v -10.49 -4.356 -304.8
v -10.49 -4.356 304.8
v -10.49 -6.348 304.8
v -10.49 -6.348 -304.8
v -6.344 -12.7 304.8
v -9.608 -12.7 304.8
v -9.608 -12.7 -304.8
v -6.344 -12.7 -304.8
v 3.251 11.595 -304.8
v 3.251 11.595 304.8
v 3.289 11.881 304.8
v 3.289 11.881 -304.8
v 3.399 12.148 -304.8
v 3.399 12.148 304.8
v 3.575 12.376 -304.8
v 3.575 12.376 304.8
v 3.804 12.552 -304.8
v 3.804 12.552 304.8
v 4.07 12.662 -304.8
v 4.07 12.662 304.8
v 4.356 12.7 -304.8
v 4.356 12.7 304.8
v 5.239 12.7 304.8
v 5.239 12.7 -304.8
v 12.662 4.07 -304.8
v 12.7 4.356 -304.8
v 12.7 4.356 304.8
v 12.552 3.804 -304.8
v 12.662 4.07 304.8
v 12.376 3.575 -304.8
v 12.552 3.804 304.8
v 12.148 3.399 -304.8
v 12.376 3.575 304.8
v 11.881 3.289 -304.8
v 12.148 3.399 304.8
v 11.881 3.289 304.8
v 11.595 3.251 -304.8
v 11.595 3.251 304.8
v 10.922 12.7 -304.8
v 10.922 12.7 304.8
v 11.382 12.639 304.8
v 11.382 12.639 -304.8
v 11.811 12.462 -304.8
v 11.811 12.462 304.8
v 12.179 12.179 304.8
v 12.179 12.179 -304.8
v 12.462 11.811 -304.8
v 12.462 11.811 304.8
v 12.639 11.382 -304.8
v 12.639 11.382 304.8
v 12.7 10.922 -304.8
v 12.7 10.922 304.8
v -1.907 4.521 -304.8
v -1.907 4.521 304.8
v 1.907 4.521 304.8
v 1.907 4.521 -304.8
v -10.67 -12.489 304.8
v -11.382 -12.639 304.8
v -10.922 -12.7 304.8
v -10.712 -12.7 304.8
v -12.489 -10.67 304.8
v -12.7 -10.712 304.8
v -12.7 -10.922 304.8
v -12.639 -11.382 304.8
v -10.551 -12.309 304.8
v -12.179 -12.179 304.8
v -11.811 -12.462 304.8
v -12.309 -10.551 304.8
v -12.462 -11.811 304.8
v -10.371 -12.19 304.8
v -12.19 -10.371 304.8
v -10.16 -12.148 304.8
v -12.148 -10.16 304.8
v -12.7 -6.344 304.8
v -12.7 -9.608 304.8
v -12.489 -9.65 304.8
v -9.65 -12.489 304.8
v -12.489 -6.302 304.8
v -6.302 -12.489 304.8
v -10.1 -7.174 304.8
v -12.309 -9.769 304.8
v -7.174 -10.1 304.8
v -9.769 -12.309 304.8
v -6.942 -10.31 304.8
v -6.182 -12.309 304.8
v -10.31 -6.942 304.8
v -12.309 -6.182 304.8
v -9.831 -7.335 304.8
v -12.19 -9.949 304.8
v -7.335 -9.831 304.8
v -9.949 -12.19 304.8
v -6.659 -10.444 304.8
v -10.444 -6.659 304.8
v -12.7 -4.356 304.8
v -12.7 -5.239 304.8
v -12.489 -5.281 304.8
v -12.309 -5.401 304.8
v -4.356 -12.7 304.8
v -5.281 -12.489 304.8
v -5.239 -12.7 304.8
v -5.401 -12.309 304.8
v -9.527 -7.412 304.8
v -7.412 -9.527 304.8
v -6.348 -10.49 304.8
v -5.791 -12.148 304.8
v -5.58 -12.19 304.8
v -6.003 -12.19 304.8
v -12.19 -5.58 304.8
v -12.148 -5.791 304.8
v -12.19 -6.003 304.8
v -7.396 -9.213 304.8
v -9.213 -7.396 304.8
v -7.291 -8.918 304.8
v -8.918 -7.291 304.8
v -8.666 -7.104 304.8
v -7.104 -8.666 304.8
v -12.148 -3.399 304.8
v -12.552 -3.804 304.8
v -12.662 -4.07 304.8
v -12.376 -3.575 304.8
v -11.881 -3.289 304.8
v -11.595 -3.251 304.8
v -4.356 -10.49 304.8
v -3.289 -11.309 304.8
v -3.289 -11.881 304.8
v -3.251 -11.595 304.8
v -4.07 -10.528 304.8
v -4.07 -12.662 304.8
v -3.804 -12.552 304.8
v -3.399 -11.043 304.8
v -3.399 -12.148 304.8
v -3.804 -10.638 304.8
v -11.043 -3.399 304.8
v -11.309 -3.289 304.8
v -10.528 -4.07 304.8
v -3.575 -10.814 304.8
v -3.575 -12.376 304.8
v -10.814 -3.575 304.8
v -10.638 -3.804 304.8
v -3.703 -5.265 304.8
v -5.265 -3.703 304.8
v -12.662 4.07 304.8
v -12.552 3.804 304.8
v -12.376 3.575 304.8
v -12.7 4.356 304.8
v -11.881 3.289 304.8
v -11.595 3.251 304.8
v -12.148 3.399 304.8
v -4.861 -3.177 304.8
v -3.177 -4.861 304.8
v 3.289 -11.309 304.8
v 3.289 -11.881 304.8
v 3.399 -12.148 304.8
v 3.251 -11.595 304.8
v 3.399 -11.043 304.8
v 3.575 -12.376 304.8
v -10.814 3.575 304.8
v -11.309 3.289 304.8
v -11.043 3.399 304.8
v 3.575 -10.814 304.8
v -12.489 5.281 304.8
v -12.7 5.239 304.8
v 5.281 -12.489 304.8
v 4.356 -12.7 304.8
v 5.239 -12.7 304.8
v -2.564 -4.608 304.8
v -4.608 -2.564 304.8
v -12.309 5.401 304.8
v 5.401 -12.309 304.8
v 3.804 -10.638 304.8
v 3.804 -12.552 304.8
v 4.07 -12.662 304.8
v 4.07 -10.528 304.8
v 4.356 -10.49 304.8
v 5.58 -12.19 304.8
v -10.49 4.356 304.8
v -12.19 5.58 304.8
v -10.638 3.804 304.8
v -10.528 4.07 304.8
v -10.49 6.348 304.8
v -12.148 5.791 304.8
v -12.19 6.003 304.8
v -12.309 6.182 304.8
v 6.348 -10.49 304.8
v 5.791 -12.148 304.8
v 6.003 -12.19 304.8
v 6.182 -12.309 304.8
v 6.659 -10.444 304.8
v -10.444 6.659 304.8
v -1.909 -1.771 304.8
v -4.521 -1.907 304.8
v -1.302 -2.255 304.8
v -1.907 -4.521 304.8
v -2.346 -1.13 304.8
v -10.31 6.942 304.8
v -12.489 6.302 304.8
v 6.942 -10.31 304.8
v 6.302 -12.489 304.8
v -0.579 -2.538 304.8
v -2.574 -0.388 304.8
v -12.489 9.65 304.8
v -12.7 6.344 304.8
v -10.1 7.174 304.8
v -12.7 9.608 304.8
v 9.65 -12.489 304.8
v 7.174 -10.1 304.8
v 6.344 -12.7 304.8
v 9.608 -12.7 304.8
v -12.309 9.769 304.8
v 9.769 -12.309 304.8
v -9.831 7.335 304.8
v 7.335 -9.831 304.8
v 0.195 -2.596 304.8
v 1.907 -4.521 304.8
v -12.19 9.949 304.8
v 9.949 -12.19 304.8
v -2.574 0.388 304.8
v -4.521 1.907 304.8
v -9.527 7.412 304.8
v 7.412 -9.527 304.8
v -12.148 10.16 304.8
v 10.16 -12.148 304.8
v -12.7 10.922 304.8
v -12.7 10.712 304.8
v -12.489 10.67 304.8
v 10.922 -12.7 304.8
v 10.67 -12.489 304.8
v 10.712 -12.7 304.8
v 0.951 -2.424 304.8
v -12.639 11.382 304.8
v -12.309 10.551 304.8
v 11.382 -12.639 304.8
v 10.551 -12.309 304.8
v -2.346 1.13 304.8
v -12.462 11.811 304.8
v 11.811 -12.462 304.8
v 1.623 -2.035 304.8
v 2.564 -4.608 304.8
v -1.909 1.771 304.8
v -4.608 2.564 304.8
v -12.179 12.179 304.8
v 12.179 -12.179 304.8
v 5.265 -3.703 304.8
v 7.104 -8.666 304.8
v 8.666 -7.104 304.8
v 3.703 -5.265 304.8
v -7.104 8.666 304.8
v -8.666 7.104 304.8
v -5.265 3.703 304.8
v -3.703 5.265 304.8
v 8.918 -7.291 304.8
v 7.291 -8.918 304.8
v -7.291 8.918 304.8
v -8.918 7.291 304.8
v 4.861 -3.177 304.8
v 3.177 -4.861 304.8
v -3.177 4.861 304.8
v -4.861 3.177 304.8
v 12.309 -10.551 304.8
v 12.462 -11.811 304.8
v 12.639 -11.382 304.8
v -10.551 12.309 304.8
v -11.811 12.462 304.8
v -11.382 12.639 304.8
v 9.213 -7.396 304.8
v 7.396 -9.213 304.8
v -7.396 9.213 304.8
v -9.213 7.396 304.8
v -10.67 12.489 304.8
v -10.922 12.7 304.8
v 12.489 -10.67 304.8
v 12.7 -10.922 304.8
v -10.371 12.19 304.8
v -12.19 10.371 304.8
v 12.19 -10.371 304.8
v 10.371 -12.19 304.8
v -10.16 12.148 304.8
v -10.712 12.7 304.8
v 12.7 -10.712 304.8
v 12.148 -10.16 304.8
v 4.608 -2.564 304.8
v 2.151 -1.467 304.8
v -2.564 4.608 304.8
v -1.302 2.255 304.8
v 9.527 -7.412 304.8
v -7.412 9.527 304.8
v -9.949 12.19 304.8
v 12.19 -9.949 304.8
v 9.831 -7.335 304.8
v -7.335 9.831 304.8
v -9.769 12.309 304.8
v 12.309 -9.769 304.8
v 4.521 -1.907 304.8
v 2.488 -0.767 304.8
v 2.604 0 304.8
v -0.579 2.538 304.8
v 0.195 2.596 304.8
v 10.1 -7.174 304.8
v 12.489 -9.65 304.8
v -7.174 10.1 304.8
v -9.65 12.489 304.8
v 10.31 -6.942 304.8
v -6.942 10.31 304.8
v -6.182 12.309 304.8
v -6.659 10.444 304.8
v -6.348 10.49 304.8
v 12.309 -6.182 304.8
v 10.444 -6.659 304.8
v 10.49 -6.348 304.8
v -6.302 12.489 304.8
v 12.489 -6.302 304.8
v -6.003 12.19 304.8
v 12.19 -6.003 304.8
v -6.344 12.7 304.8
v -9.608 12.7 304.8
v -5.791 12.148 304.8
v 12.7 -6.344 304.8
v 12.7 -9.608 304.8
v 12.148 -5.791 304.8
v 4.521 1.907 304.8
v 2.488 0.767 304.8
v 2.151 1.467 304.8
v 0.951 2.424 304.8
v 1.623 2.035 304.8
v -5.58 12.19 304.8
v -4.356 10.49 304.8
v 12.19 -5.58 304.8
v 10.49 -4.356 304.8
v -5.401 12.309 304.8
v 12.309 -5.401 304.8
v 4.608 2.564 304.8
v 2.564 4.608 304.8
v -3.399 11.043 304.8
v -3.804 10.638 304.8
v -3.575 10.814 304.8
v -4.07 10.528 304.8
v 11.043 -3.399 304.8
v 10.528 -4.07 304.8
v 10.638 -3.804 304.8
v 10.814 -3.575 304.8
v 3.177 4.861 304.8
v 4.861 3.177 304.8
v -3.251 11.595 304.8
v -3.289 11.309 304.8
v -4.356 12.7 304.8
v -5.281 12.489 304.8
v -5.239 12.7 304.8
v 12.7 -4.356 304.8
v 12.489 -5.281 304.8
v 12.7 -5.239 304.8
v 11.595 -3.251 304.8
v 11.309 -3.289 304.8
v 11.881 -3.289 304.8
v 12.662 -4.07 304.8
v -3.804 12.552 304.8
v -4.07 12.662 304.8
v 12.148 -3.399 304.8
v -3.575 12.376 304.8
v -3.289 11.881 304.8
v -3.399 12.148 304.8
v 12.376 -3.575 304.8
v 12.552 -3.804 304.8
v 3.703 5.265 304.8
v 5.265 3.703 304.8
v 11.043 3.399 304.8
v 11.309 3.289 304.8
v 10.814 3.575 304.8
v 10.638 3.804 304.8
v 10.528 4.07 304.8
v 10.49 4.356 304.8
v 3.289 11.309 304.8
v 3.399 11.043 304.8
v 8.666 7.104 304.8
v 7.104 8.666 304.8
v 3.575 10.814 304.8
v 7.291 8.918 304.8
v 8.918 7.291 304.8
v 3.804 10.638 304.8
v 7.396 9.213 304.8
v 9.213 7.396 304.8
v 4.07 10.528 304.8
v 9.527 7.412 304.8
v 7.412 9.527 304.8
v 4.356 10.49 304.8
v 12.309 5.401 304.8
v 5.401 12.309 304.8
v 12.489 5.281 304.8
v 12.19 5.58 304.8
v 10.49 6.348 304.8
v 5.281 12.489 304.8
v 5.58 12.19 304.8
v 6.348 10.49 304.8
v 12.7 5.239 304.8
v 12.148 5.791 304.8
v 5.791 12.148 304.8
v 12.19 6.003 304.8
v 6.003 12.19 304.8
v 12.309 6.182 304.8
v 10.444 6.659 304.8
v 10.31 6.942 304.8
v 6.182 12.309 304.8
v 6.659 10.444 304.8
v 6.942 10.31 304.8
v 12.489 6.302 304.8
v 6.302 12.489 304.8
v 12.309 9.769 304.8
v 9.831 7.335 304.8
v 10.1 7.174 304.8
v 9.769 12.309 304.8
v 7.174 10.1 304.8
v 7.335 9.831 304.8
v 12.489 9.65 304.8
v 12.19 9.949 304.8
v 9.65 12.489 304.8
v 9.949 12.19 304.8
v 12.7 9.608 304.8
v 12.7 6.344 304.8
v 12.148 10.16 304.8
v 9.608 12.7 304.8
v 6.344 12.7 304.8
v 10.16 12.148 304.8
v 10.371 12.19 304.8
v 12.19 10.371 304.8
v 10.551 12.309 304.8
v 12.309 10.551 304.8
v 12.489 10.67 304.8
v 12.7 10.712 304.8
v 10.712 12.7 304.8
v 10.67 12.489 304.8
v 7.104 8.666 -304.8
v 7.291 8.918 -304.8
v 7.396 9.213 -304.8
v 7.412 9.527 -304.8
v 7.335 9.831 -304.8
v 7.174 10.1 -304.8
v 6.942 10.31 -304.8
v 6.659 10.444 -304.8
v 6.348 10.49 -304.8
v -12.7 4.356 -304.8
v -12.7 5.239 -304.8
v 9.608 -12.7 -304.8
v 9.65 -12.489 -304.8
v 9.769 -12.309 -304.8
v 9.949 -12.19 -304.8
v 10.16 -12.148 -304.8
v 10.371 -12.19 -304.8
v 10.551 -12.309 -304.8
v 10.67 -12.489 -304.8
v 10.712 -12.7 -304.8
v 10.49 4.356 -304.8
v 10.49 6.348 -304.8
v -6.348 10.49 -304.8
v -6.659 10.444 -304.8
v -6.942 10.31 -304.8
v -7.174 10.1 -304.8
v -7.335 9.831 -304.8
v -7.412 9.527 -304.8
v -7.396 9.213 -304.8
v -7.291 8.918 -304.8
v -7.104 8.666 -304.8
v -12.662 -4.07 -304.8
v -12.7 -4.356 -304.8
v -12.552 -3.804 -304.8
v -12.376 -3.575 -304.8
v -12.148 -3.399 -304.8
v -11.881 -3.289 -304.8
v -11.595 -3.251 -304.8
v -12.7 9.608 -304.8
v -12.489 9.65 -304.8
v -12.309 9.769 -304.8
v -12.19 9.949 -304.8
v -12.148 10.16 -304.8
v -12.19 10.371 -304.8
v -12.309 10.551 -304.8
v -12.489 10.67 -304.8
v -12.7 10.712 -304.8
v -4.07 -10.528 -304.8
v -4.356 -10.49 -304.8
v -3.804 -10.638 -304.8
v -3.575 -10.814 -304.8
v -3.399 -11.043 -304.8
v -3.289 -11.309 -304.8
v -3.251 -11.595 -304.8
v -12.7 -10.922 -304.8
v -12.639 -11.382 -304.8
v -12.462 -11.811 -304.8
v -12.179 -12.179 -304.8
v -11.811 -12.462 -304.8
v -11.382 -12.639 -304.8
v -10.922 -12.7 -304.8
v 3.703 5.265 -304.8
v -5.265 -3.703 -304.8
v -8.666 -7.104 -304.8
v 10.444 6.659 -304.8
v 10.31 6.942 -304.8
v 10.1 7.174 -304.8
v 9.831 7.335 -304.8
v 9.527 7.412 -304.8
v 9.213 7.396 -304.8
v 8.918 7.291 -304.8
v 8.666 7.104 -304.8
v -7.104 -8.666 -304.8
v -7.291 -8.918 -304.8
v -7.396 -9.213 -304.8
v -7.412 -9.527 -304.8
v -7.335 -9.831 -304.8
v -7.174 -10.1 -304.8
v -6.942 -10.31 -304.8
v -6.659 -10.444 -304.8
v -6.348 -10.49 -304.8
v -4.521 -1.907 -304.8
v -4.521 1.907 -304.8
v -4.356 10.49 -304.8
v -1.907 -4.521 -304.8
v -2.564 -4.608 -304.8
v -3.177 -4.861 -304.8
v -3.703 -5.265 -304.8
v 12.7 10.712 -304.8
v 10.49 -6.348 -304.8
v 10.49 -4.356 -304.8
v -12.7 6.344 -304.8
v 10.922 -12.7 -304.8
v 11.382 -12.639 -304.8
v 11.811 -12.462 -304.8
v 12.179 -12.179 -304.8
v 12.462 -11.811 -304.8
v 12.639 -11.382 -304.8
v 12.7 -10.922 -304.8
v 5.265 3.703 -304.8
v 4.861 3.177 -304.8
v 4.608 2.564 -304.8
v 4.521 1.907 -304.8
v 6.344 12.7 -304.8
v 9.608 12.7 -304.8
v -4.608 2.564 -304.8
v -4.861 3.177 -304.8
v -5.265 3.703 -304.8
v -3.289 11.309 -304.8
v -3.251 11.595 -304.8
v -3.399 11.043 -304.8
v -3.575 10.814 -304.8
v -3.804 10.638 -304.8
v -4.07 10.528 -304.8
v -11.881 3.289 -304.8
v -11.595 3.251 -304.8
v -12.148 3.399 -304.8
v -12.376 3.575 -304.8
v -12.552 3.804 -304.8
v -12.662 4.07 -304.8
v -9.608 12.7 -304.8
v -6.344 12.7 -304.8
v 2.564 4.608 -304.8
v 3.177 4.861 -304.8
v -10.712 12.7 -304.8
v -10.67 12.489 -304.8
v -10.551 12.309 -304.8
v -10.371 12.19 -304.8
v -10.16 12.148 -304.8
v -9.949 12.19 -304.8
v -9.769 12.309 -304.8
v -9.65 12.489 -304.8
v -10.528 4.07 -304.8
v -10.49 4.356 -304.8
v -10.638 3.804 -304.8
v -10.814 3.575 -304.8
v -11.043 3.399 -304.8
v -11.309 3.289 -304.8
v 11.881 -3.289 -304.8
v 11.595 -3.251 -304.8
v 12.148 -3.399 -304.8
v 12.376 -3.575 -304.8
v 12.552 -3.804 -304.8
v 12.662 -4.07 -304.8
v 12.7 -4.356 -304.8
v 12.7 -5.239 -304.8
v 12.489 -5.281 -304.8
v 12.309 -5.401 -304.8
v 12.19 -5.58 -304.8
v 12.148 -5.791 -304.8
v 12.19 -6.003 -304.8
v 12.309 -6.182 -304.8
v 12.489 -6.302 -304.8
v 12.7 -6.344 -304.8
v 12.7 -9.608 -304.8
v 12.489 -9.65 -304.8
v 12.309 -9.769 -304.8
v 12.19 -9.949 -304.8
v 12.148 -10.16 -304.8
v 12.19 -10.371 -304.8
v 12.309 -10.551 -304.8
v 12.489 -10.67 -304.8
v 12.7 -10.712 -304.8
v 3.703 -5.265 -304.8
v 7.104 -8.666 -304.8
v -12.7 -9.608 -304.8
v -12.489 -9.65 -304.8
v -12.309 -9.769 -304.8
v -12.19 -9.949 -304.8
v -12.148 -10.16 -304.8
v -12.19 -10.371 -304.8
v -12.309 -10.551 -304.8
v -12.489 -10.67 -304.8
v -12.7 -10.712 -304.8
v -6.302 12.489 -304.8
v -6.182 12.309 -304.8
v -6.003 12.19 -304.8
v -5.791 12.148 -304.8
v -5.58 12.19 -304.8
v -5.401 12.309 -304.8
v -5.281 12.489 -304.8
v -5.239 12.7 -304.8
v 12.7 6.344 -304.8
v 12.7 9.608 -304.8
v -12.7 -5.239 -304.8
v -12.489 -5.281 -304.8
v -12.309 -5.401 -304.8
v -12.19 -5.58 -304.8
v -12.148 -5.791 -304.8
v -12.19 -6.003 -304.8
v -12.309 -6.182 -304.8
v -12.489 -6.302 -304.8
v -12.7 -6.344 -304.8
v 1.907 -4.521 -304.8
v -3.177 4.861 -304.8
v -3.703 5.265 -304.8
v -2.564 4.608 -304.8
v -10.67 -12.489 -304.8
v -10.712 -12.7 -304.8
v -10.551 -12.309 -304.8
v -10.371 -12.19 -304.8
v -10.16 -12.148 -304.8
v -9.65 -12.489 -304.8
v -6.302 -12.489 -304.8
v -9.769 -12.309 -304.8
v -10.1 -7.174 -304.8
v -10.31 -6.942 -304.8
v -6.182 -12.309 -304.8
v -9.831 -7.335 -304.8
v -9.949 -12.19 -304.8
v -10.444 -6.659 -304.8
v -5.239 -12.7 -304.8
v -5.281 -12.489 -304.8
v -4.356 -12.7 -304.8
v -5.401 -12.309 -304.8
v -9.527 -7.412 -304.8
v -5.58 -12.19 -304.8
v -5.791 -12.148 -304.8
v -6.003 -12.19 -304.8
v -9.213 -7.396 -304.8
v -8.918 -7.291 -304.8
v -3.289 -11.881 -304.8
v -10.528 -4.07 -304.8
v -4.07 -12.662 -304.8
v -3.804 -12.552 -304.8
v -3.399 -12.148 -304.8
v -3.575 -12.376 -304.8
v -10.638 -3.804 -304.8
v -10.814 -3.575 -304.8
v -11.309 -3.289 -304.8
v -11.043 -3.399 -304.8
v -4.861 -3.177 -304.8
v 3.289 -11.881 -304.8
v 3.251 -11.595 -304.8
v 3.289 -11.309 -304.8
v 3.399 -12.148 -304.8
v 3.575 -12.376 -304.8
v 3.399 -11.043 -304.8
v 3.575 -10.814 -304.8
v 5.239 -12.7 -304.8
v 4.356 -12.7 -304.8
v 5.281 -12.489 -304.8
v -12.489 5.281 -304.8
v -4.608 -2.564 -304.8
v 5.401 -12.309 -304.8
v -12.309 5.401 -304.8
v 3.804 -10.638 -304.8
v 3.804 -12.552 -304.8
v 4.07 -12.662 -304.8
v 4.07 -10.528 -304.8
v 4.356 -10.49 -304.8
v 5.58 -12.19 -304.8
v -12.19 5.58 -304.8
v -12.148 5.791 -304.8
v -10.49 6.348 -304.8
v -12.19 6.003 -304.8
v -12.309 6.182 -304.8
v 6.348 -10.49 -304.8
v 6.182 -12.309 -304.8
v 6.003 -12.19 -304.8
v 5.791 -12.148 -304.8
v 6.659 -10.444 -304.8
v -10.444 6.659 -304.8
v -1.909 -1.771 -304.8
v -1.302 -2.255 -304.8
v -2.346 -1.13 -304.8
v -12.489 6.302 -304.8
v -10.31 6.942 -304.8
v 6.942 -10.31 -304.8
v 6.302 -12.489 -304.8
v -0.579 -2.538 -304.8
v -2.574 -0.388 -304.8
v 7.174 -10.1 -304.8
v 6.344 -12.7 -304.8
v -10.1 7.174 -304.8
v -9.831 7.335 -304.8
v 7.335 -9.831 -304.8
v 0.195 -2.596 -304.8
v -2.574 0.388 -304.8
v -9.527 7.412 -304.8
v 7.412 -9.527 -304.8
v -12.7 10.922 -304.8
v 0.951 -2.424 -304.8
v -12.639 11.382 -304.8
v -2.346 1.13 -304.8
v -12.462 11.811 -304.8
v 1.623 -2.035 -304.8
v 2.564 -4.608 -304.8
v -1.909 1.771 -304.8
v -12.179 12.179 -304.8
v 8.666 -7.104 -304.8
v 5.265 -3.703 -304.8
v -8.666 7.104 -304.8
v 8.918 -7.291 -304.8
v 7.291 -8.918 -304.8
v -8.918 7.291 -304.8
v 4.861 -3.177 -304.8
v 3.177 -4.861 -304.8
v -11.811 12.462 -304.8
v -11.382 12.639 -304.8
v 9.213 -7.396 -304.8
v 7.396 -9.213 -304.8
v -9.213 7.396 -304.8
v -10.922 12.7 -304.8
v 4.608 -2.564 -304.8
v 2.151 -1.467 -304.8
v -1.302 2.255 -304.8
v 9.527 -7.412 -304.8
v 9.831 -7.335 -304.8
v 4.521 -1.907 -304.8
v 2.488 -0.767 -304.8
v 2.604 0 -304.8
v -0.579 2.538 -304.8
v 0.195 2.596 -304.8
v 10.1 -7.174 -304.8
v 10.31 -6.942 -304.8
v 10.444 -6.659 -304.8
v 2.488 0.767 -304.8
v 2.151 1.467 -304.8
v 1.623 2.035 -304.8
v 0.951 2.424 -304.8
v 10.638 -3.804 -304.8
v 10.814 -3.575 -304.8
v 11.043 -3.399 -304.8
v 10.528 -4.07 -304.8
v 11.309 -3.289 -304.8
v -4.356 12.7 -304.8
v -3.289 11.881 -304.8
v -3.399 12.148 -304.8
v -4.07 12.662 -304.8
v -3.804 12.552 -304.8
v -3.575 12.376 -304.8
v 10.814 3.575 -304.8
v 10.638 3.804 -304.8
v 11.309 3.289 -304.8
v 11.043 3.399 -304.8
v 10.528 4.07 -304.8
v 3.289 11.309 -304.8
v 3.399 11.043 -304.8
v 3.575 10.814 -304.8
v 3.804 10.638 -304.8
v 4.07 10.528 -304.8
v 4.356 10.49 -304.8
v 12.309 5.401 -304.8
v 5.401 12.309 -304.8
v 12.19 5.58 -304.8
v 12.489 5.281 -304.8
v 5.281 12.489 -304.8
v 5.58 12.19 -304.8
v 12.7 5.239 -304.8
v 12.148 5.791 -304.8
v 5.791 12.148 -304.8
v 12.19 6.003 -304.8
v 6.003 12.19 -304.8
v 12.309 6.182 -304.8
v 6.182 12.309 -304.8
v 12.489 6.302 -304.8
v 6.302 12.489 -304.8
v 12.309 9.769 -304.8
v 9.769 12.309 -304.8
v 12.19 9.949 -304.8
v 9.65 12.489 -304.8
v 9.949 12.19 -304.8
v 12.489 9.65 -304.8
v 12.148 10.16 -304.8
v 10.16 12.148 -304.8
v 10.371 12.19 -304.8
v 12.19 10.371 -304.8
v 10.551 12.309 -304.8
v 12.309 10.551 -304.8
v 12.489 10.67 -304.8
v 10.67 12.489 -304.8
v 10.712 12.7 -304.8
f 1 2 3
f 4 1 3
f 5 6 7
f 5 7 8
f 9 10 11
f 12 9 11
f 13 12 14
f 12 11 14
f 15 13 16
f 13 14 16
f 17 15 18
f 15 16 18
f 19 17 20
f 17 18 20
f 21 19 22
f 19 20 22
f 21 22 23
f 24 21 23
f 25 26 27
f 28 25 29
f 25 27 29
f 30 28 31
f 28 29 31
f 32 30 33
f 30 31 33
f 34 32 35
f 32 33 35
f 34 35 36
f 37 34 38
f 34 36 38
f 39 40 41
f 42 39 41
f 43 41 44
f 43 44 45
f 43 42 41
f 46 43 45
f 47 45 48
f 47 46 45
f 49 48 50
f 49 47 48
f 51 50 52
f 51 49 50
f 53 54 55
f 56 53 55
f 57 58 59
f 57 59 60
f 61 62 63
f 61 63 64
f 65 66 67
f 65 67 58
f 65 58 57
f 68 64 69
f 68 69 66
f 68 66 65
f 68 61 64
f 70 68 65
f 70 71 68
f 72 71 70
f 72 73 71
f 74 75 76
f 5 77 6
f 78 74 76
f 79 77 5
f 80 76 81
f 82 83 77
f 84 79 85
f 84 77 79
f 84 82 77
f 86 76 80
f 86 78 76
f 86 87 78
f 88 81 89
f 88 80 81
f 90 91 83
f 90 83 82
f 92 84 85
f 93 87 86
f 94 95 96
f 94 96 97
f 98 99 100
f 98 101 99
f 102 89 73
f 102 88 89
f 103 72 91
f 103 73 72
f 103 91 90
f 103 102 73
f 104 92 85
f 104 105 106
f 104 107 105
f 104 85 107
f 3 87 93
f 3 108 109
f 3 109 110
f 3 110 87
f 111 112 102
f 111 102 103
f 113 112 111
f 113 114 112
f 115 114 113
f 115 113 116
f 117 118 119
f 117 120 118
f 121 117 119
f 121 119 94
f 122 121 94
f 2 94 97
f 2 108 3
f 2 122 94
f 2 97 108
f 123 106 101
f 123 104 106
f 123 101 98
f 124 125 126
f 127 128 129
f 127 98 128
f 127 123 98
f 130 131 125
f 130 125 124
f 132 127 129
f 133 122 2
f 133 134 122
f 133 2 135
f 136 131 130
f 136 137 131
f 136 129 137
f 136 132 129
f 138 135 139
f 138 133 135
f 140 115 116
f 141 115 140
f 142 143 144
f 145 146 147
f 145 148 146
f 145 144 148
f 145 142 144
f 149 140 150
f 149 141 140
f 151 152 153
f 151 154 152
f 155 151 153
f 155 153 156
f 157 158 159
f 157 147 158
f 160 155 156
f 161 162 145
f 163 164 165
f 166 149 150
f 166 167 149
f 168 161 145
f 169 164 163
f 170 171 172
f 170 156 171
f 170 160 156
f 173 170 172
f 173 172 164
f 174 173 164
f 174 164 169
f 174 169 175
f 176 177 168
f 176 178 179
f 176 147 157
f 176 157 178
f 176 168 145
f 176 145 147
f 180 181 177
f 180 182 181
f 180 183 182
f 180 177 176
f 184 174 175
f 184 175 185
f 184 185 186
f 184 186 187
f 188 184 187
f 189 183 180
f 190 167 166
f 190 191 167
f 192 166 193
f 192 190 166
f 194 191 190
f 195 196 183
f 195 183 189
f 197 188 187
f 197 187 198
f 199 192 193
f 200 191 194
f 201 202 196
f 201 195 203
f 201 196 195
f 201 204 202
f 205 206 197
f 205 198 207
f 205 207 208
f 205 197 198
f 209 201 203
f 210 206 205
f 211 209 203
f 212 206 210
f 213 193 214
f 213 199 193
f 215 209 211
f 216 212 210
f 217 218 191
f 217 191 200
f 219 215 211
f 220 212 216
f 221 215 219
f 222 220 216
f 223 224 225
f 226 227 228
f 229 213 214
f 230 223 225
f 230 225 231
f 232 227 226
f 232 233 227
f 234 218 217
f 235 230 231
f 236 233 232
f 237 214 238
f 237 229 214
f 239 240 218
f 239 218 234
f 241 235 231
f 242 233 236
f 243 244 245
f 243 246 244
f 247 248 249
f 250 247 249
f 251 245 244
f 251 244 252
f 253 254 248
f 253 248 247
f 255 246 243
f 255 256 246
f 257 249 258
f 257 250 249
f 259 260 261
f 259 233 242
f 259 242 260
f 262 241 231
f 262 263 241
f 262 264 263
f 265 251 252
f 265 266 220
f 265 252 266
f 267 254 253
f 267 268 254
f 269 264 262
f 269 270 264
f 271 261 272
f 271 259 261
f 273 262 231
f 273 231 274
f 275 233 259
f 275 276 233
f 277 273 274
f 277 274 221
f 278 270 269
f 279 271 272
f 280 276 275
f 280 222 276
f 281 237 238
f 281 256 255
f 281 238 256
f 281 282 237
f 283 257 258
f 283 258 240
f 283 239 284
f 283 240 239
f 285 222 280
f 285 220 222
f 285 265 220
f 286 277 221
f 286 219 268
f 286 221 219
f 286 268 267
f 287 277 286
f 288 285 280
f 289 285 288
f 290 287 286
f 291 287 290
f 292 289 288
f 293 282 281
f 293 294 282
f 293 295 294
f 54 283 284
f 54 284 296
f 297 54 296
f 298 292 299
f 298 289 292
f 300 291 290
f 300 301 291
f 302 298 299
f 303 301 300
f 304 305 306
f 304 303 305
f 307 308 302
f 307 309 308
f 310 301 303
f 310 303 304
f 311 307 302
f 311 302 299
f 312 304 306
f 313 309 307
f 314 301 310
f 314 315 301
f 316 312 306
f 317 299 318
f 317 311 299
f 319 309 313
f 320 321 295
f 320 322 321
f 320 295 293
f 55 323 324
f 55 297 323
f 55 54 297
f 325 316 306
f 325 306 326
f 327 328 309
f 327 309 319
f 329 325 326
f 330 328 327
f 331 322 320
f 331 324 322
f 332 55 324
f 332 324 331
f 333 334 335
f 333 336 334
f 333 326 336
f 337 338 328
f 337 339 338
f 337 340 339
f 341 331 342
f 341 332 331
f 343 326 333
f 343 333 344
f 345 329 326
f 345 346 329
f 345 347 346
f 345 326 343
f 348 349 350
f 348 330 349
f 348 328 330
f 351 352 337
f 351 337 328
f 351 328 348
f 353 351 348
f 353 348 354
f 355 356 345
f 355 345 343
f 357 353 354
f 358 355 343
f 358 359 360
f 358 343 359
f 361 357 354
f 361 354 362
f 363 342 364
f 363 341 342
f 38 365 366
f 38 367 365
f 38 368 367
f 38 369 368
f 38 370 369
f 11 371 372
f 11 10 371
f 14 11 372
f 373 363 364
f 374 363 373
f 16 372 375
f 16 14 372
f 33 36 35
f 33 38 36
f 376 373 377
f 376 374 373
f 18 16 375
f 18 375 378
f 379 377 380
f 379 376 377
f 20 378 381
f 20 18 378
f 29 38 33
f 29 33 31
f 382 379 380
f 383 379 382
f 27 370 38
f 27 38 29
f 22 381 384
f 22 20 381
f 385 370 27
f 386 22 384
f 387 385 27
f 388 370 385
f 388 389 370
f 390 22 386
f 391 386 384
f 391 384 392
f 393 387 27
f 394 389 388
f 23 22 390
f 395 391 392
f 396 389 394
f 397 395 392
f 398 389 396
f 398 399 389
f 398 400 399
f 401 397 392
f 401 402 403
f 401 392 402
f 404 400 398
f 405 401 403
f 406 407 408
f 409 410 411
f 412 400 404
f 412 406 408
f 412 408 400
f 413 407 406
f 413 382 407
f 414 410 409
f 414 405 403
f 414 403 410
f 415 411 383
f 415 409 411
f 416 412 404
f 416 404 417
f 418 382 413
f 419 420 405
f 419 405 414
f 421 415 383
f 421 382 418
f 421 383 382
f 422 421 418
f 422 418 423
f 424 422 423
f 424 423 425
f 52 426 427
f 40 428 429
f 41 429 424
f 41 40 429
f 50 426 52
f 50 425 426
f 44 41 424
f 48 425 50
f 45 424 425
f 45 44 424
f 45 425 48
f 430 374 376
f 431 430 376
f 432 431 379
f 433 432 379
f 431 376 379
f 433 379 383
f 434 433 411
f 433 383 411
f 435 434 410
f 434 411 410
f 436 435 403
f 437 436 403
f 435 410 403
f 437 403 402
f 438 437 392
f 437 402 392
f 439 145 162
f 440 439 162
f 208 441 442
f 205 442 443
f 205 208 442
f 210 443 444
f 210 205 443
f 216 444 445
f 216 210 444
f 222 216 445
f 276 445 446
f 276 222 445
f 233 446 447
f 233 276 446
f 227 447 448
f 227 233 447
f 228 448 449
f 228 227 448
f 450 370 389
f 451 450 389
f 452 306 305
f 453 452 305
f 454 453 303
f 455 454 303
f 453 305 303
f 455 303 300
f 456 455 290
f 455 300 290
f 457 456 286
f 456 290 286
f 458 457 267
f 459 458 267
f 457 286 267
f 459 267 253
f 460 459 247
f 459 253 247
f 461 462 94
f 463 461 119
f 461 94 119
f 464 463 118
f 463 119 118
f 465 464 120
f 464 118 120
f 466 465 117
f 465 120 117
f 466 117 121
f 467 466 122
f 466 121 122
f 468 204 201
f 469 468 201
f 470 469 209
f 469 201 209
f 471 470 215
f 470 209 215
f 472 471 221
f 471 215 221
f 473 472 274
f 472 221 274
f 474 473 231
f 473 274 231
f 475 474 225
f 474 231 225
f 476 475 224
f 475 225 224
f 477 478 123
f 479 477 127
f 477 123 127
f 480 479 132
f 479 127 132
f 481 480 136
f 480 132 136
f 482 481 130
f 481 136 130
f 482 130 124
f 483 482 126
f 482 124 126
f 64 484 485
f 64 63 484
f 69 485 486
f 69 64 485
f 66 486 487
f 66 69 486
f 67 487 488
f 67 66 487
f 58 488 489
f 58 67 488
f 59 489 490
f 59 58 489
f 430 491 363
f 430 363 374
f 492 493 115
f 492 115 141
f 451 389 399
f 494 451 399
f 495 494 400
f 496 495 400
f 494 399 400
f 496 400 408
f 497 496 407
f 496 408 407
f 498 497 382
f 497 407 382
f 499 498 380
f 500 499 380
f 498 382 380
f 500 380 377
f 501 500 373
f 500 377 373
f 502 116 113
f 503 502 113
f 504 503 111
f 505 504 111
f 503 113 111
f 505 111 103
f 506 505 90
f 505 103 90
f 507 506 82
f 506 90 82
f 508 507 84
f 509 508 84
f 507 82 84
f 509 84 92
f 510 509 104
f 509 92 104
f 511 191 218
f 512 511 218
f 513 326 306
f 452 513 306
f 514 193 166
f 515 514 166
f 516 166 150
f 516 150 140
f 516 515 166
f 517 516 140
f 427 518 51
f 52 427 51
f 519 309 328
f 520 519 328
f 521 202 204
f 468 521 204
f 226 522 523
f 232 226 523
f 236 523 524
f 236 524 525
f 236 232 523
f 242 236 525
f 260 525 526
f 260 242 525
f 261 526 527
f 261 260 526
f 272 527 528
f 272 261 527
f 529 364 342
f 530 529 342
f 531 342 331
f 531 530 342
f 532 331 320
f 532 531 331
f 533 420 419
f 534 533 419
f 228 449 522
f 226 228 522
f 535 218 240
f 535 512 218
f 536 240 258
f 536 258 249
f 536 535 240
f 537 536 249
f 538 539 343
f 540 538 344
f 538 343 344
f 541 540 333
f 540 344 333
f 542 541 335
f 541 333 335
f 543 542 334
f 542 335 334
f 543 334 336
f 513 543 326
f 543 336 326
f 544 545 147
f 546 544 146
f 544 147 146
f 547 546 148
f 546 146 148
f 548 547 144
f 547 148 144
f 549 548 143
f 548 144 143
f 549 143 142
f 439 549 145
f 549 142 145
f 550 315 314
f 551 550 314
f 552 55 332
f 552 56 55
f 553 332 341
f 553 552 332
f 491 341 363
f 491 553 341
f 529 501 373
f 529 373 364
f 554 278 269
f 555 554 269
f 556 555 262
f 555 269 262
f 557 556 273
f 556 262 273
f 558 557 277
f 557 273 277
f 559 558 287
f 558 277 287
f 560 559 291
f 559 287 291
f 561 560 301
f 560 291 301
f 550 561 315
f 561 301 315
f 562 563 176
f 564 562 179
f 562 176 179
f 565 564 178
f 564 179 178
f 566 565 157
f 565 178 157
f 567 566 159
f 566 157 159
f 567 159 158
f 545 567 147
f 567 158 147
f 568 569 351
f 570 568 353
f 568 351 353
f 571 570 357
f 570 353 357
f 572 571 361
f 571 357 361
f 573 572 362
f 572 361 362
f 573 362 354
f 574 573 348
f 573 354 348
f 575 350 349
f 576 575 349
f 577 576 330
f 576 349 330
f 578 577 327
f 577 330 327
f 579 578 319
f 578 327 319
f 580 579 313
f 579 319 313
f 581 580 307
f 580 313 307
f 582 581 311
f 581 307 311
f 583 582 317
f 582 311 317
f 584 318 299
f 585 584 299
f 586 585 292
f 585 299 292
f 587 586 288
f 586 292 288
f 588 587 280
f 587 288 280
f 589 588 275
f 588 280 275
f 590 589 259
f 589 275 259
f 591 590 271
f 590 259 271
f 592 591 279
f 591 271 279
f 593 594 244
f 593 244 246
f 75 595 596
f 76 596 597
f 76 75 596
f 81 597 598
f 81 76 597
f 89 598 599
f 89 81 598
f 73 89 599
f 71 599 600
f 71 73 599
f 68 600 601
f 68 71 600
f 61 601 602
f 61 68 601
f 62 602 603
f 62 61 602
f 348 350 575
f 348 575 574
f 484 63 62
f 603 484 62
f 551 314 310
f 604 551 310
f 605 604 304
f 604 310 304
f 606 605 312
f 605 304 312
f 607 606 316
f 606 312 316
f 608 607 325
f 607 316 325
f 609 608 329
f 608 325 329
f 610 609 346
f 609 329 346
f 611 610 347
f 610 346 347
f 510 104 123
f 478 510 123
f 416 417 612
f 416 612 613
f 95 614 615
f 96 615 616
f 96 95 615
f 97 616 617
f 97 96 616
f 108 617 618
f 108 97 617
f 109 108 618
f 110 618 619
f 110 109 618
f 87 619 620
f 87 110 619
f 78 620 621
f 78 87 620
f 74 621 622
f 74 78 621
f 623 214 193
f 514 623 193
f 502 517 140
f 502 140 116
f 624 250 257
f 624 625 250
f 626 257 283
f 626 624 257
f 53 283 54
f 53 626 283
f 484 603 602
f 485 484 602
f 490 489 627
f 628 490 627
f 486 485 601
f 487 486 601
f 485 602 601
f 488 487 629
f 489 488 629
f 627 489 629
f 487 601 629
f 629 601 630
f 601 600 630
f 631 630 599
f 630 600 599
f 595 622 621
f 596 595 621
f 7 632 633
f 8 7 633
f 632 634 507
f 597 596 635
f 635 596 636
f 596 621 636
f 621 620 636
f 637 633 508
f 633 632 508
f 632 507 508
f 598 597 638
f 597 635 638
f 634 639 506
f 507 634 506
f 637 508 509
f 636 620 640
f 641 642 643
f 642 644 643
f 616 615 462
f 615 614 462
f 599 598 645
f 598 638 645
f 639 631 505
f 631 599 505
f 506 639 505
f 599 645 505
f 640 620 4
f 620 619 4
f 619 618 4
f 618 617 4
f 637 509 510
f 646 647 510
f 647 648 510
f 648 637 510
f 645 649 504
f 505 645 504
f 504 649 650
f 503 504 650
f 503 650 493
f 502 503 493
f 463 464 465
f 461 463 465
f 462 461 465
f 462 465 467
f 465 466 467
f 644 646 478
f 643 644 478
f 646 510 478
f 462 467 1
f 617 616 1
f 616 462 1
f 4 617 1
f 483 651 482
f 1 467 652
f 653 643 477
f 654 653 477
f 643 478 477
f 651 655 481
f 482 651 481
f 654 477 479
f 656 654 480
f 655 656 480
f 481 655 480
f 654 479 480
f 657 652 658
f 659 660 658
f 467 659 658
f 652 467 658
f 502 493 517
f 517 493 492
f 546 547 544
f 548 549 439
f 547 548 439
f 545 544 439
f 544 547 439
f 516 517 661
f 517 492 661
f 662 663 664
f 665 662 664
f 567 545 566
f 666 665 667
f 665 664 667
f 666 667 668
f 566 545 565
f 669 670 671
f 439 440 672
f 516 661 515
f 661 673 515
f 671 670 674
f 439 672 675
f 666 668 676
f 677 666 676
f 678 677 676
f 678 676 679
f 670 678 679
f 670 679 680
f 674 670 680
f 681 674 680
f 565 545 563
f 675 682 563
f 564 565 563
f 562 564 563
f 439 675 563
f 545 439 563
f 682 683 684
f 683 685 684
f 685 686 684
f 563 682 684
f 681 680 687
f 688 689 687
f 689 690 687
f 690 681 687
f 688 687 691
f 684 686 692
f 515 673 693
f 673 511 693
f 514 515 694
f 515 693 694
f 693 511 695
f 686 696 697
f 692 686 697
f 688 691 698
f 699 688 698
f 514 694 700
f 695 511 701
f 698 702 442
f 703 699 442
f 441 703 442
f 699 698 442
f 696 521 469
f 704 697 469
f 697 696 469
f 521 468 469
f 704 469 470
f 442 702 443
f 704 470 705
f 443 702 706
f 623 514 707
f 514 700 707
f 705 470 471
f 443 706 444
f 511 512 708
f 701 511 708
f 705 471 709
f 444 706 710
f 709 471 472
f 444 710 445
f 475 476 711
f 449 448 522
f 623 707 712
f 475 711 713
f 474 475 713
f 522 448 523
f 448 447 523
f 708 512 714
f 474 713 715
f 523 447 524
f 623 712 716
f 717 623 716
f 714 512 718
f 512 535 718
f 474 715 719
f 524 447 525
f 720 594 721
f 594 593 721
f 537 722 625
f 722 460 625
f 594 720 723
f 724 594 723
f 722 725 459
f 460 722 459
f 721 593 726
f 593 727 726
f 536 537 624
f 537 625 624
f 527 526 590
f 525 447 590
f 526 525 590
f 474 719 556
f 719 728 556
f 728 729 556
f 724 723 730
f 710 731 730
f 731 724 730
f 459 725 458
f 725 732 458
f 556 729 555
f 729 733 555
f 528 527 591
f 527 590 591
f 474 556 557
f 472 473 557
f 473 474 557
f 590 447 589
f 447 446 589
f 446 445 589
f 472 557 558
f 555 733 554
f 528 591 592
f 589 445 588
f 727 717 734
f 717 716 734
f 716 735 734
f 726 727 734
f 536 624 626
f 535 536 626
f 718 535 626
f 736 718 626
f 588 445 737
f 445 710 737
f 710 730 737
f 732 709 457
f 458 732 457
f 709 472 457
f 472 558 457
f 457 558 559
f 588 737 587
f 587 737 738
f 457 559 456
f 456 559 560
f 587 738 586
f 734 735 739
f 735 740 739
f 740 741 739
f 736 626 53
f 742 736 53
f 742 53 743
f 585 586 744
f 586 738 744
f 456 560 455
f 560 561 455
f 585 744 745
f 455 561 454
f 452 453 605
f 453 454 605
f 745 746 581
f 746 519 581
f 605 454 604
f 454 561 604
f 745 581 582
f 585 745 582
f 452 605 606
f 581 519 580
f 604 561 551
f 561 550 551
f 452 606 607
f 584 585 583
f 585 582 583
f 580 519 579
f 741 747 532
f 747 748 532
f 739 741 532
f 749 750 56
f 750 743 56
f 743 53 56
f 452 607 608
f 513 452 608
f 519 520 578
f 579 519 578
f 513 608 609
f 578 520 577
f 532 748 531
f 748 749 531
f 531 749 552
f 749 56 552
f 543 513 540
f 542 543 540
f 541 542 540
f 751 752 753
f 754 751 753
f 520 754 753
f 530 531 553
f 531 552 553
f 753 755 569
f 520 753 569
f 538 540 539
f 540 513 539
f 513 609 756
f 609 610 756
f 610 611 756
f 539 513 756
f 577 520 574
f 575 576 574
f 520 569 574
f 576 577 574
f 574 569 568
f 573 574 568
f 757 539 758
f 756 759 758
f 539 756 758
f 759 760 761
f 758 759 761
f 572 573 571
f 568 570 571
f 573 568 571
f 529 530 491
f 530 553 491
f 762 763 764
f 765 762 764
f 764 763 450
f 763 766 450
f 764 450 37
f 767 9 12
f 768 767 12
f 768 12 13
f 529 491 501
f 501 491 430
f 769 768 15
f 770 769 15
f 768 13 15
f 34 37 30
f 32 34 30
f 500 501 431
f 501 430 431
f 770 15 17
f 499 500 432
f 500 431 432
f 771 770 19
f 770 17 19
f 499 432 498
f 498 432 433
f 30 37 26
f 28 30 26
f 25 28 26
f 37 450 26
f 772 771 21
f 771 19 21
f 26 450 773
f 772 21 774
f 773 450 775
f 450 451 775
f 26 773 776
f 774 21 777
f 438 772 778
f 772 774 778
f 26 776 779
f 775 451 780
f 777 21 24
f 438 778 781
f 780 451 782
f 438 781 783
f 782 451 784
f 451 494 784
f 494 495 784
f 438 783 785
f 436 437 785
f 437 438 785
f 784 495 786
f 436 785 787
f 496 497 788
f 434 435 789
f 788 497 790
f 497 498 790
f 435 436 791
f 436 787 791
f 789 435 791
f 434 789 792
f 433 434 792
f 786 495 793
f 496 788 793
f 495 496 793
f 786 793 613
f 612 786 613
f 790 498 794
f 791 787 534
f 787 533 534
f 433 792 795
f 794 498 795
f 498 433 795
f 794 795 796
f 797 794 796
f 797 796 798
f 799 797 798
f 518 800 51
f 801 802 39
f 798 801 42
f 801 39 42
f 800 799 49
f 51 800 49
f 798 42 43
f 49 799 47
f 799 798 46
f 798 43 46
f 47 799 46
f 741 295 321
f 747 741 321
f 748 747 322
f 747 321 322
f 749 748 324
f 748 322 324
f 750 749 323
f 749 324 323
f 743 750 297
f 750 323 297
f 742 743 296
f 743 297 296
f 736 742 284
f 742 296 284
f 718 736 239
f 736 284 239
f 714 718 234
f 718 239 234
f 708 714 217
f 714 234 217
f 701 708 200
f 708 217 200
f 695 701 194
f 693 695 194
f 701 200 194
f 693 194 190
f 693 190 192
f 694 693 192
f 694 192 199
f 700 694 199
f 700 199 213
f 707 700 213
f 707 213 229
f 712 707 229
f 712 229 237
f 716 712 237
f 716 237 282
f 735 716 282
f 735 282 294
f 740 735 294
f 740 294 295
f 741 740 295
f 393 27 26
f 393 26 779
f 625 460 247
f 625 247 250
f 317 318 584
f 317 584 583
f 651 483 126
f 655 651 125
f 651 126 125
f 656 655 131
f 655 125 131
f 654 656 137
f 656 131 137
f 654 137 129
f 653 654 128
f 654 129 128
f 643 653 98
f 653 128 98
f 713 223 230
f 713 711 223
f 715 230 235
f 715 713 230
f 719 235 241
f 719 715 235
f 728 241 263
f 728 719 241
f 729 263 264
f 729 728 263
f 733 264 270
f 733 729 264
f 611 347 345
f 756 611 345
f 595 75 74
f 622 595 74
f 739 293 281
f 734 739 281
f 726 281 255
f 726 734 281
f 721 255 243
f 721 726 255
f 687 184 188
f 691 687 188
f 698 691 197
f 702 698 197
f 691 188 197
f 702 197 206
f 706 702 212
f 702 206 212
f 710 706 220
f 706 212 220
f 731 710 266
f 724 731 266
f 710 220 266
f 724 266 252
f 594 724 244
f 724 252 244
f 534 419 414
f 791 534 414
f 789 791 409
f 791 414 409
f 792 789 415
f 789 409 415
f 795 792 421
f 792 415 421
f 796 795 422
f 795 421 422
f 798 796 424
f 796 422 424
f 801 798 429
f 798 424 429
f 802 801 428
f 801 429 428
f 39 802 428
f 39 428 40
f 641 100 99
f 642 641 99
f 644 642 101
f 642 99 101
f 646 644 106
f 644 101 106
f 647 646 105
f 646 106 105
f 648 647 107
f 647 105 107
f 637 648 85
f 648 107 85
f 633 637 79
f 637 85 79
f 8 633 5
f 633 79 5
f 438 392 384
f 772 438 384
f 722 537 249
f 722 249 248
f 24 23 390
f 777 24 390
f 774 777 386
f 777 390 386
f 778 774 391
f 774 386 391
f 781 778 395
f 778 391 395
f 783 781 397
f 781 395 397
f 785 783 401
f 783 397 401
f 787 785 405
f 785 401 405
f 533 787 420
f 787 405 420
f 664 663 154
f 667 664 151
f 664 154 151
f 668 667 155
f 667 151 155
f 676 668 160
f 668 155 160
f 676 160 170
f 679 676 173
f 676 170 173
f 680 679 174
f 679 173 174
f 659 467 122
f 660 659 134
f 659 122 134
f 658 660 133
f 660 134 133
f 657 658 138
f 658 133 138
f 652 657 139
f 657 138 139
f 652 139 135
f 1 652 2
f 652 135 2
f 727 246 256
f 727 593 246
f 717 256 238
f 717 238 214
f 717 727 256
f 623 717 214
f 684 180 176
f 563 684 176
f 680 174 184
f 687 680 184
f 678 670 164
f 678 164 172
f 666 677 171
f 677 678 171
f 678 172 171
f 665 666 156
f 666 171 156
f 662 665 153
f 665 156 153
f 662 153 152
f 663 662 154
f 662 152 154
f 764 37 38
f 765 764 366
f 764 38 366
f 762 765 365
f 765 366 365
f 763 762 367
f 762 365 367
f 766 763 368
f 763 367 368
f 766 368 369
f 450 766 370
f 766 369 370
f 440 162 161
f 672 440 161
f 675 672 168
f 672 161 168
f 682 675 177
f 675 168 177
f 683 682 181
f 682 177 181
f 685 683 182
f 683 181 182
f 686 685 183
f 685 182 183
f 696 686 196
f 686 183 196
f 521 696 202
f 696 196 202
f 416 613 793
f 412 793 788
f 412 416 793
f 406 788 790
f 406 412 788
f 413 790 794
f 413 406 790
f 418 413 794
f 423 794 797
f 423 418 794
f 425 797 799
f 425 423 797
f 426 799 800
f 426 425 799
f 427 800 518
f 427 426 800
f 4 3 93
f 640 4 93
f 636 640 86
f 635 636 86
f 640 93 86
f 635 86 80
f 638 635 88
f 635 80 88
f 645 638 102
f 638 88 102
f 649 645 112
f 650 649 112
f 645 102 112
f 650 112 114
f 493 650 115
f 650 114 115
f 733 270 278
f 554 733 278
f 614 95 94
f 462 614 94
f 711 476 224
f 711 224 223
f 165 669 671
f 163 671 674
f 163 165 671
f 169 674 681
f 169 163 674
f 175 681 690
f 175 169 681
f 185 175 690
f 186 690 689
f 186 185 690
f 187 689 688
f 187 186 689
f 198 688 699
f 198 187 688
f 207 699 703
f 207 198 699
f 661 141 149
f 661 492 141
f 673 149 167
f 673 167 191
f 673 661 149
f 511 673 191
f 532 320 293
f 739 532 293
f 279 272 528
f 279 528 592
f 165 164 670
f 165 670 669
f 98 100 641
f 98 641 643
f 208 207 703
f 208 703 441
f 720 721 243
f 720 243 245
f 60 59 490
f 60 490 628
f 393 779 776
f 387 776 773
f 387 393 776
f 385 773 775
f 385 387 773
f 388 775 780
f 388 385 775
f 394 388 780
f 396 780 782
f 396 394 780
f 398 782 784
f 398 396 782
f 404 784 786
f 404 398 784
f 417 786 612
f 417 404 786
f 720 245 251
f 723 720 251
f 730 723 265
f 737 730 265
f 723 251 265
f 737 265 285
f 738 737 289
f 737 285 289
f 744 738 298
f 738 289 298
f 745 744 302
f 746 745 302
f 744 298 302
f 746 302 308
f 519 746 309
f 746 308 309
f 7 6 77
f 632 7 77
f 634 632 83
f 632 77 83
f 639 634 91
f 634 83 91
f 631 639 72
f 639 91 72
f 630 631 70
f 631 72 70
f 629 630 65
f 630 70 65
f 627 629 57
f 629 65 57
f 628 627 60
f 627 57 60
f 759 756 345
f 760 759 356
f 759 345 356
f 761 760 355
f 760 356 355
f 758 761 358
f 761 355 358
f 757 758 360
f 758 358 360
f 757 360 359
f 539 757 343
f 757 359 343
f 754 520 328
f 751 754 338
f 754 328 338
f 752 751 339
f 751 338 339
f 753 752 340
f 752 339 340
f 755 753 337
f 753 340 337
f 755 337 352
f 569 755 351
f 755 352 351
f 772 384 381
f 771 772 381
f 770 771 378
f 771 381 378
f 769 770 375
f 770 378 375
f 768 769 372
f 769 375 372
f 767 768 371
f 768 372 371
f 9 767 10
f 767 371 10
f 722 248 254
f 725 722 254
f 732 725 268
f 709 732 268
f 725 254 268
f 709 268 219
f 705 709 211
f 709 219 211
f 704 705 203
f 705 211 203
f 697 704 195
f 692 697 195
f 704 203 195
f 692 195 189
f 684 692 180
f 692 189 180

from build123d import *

# Parameters (mm, degrees)
SKETCH3_W                = 25.4
SKETCH3_H                = 25.4
BOSS_EXTRUDE1_DEPTH      = 304.8
BOSS_EXTRUDE1_DEPTH_BACK = 304.8
SKETCH4_R                = 2.6035
CUT_EXTRUDE1_DEPTH       = 610.6
CUT_EXTRUDE2_DEPTH       = 610.6
FILLET1_R                = 2.54
FILLET2_R                = 1.778


with BuildPart() as part:
    # Sketch3 → Boss-Extrude1 (new body, two sides)
    with BuildSketch(Plane.XY) as boss_extrude1_sk:
        Rectangle(SKETCH3_W, SKETCH3_H)
    extrude(amount=BOSS_EXTRUDE1_DEPTH)
    extrude(boss_extrude1_sk.sketch, amount=-BOSS_EXTRUDE1_DEPTH_BACK)

    # Sketch4 → Cut-Extrude1 (cut, through all)
    with BuildSketch(Plane.XY.offset(304.8)):
        with BuildLine():
            Line((3.2512, 12.7), (-3.2512, 12.7))
            Line((-3.2512, 12.7), (-3.2512, 10.4902))
            Line((-3.2512, 10.4902), (-6.348478019, 10.4902))
            ThreePointArc((-6.348478019, 10.4902), (-7.335478831, 9.830707141), (-7.103895736, 8.666460301))
            Line((-7.103895736, 8.666460301), (-2.958635435, 4.5212))
            Line((-2.958635435, 4.5212), (2.958635435, 4.5212))
            Line((2.958635435, 4.5212), (7.103895736, 8.666460301))
            ThreePointArc((7.103895736, 8.666460301), (7.335478831, 9.830707141), (6.348478019, 10.4902))
            Line((6.348478019, 10.4902), (3.2512, 10.4902))
            Line((3.2512, 10.4902), (3.2512, 12.7))
        make_face()
        with BuildLine():
            Line((12.7, -3.2512), (12.7, 3.2512))
            Line((12.7, 3.2512), (10.4902, 3.2512))
            Line((10.4902, 3.2512), (10.4902, 6.348478019))
            ThreePointArc((10.4902, 6.348478019), (9.830707141, 7.335478831), (8.666460301, 7.103895736))
            Line((8.666460301, 7.103895736), (4.5212, 2.958635435))
            Line((4.5212, 2.958635435), (4.5212, -2.958635435))
            Line((4.5212, -2.958635435), (8.666460301, -7.103895736))
            ThreePointArc((8.666460301, -7.103895736), (9.830707141, -7.335478831), (10.4902, -6.348478019))
            Line((10.4902, -6.348478019), (10.4902, -3.2512))
            Line((10.4902, -3.2512), (12.7, -3.2512))
        make_face()
        with BuildLine():
            Line((-3.2512, -10.4902), (-3.2512, -12.7))
            Line((-3.2512, -12.7), (3.2512, -12.7))
            Line((3.2512, -12.7), (3.2512, -10.4902))
            Line((3.2512, -10.4902), (6.348478019, -10.4902))
            ThreePointArc((6.348478019, -10.4902), (7.335478831, -9.830707141), (7.103895736, -8.666460301))
            Line((7.103895736, -8.666460301), (2.958635435, -4.5212))
            Line((2.958635435, -4.5212), (-2.958635435, -4.5212))
            Line((-2.958635435, -4.5212), (-7.103895736, -8.666460301))
            ThreePointArc((-7.103895736, -8.666460301), (-7.335478831, -9.830707141), (-6.348478019, -10.4902))
            Line((-6.348478019, -10.4902), (-3.2512, -10.4902))
        make_face()
        with BuildLine():
            Line((-10.4902, 3.2512), (-12.7, 3.2512))
            Line((-12.7, 3.2512), (-12.7, -3.2512))
            Line((-12.7, -3.2512), (-10.4902, -3.2512))
            Line((-10.4902, -3.2512), (-10.4902, -6.348478019))
            ThreePointArc((-10.4902, -6.348478019), (-9.830707141, -7.335478831), (-8.666460301, -7.103895736))
            Line((-8.666460301, -7.103895736), (-4.5212, -2.958635435))
            Line((-4.5212, -2.958635435), (-4.5212, 2.958635435))
            Line((-4.5212, 2.958635435), (-8.666460301, 7.103895736))
            ThreePointArc((-8.666460301, 7.103895736), (-9.830707141, 7.335478831), (-10.4902, 6.348478019))
            Line((-10.4902, 6.348478019), (-10.4902, 3.2512))
        make_face()
        Circle(SKETCH4_R)
    extrude(amount=-CUT_EXTRUDE1_DEPTH, mode=Mode.SUBTRACT)

    # Sketch5 → Cut-Extrude2 (cut, through all)
    with BuildSketch(Plane.XY.offset(304.8)):
        with BuildLine():
            ThreePointArc((-11.5951, 3.2512), (-12.376382283, 3.574817717), (-12.7, 4.3561))
            Line((-12.7, 4.3561), (-12.7, 3.2512))
            Line((-12.7, 3.2512), (-11.5951, 3.2512))
        make_face()
        with BuildLine():
            ThreePointArc((-10.4902, 4.3561), (-10.813817717, 3.574817717), (-11.5951, 3.2512))
            Line((-11.5951, 3.2512), (-10.4902, 3.2512))
            Line((-10.4902, 3.2512), (-10.4902, 4.3561))
        make_face()
        with BuildLine():
            Line((-12.7, -3.2512), (-12.7, -4.3561))
            ThreePointArc((-12.7, -4.3561), (-12.376382283, -3.574817717), (-11.5951, -3.2512))
            Line((-11.5951, -3.2512), (-12.7, -3.2512))
        make_face()
        with BuildLine():
            Line((-10.4902, -3.2512), (-11.5951, -3.2512))
            ThreePointArc((-11.5951, -3.2512), (-10.813817717, -3.574817717), (-10.4902, -4.3561))
            Line((-10.4902, -4.3561), (-10.4902, -3.2512))
        make_face()
        with BuildLine():
            Line((-3.2512, -11.595100007), (-3.2512, -10.4902))
            Line((-3.2512, -10.4902), (-4.3561, -10.4902))
            ThreePointArc((-4.3561, -10.4902), (-3.574817715, -10.81381772), (-3.2512, -11.595100007))
        make_face()
        with BuildLine():
            Line((-3.2512, -12.7), (-3.2512, -11.595100007))
            ThreePointArc((-3.2512, -11.595100007), (-3.57481772, -12.376382285), (-4.3561, -12.7))
            Line((-4.3561, -12.7), (-3.2512, -12.7))
        make_face()
        with BuildLine():
            Line((3.2512, -10.4902), (3.2512, -11.5951))
            ThreePointArc((3.2512, -11.5951), (3.574817718, -10.813817717), (4.3561, -10.4902))
            Line((4.3561, -10.4902), (3.2512, -10.4902))
        make_face()
        with BuildLine():
            Line((3.2512, -12.7), (4.3561, -12.7))
            ThreePointArc((4.3561, -12.7), (3.574817717, -12.376382282), (3.2512, -11.5951))
            Line((3.2512, -11.5951), (3.2512, -12.7))
        make_face()
        with BuildLine():
            Line((11.5951, -3.2512), (10.4902, -3.2512))
            Line((10.4902, -3.2512), (10.4902, -4.3561))
            ThreePointArc((10.4902, -4.3561), (10.813817717, -3.574817717), (11.5951, -3.2512))
        make_face()
        with BuildLine():
            Line((12.7, -3.2512), (11.5951, -3.2512))
            ThreePointArc((11.5951, -3.2512), (12.376382283, -3.574817717), (12.7, -4.3561))
            Line((12.7, -4.3561), (12.7, -3.2512))
        make_face()
        with BuildLine():
            Line((10.4902, 3.2512), (11.5951, 3.2512))
            ThreePointArc((11.5951, 3.2512), (10.813817717, 3.574817717), (10.4902, 4.3561))
            Line((10.4902, 4.3561), (10.4902, 3.2512))
        make_face()
        with BuildLine():
            Line((12.7, 3.2512), (12.7, 4.3561))
            ThreePointArc((12.7, 4.3561), (12.376382283, 3.574817717), (11.5951, 3.2512))
            Line((11.5951, 3.2512), (12.7, 3.2512))
        make_face()
        with BuildLine():
            Line((3.2512, 12.7), (3.2512, 11.595099996))
            ThreePointArc((3.2512, 11.595099996), (3.574817716, 12.376382281), (4.3561, 12.7))
            Line((4.3561, 12.7), (3.2512, 12.7))
        make_face()
        with BuildLine():
            Line((3.2512, 11.595099996), (3.2512, 10.4902))
            Line((3.2512, 10.4902), (4.3561, 10.4902))
            ThreePointArc((4.3561, 10.4902), (3.574817719, 10.813817716), (3.2512, 11.595099996))
        make_face()
        with BuildLine():
            Line((-3.2512, 12.7), (-4.3561, 12.7))
            ThreePointArc((-4.3561, 12.7), (-3.574817717, 12.376382283), (-3.2512, 11.5951))
            Line((-3.2512, 11.5951), (-3.2512, 12.7))
        make_face()
        with BuildLine():
            Line((-3.2512, 10.4902), (-3.2512, 11.5951))
            ThreePointArc((-3.2512, 11.5951), (-3.574817717, 10.813817717), (-4.3561, 10.4902))
            Line((-4.3561, 10.4902), (-3.2512, 10.4902))
        make_face()
        with BuildLine():
            ThreePointArc((-12.7, 5.23875), (-12.14755, 5.7912), (-12.7, 6.34365))
            Line((-12.7, 6.34365), (-12.7, 5.23875))
        make_face()
        with BuildLine():
            ThreePointArc((-12.7, 9.60755), (-12.14755, 10.16), (-12.7, 10.71245))
            Line((-12.7, 10.71245), (-12.7, 9.60755))
        make_face()
        with BuildLine():
            ThreePointArc((-10.71245, 12.7), (-10.16, 12.14755), (-9.60755, 12.7))
            Line((-9.60755, 12.7), (-10.71245, 12.7))
        make_face()
        with BuildLine():
            ThreePointArc((-6.34365, 12.7), (-5.7912, 12.14755), (-5.23875, 12.7))
            Line((-5.23875, 12.7), (-6.34365, 12.7))
        make_face()
        with BuildLine():
            Line((6.34365, 12.7), (5.23875, 12.7))
            ThreePointArc((5.23875, 12.7), (5.7912, 12.14755), (6.34365, 12.7))
        make_face()
        with BuildLine():
            Line((10.71245, 12.7), (9.60755, 12.7))
            ThreePointArc((9.60755, 12.7), (10.16, 12.14755), (10.71245, 12.7))
        make_face()
        with BuildLine():
            Line((12.7, 10.71245), (12.7, 9.60755))
            ThreePointArc((12.7, 9.60755), (12.14755, 10.16), (12.7, 10.71245))
        make_face()
        with BuildLine():
            Line((12.7, 6.34365), (12.7, 5.23875))
            ThreePointArc((12.7, 5.23875), (12.14755, 5.7912), (12.7, 6.34365))
        make_face()
        with BuildLine():
            Line((-12.7, -6.34365), (-12.7, -5.23875))
            ThreePointArc((-12.7, -5.23875), (-12.14755, -5.7912), (-12.7, -6.34365))
        make_face()
        with BuildLine():
            Line((-12.7, -10.71245), (-12.7, -9.60755))
            ThreePointArc((-12.7, -9.60755), (-12.14755, -10.16), (-12.7, -10.71245))
        make_face()
        with BuildLine():
            Line((-10.71245, -12.7), (-9.60755, -12.7))
            ThreePointArc((-9.60755, -12.7), (-10.16, -12.14755), (-10.71245, -12.7))
        make_face()
        with BuildLine():
            Line((-6.34365, -12.7), (-5.23875, -12.7))
            ThreePointArc((-5.23875, -12.7), (-5.7912, -12.14755), (-6.34365, -12.7))
        make_face()
        with BuildLine():
            Line((12.7, -10.71245), (12.7, -9.60755))
            ThreePointArc((12.7, -9.60755), (12.14755, -10.16), (12.7, -10.71245))
        make_face()
        with BuildLine():
            Line((12.7, -6.34365), (12.7, -5.23875))
            ThreePointArc((12.7, -5.23875), (12.14755, -5.7912), (12.7, -6.34365))
        make_face()
        with BuildLine():
            Line((10.71245, -12.7), (9.60755, -12.7))
            ThreePointArc((9.60755, -12.7), (10.16, -12.14755), (10.71245, -12.7))
        make_face()
        with BuildLine():
            Line((6.34365, -12.7), (5.23875, -12.7))
            ThreePointArc((5.23875, -12.7), (5.7912, -12.14755), (6.34365, -12.7))
        make_face()
    extrude(amount=-CUT_EXTRUDE2_DEPTH, mode=Mode.SUBTRACT)

    # Fillet1
    fillet1_edges = [part.edges().sort_by_distance(p)[0] for p in [
        (2.958635435, 4.5212, 0),
        (-2.958635435, 4.5212, 0),
        (-2.958635435, -4.5212, 0),
        (2.958635435, -4.5212, 0),
        (4.5212, -2.958635435, 0),
        (4.5212, 2.958635435, 0),
        (-4.5212, 2.958635435, 0),
        (-4.5212, -2.958635435, 0),
    ]]
    fillet(fillet1_edges, radius=FILLET1_R)

    # Fillet2
    fillet2_edges = [part.edges().sort_by_distance(p)[0] for p in [
        (-12.7, 12.7, 0),
        (12.7, 12.7, 0),
        (12.7, -12.7, 0),
        (-12.7, -12.7, 0),
    ]]
    fillet(fillet2_edges, radius=FILLET2_R)


solid = part.part
